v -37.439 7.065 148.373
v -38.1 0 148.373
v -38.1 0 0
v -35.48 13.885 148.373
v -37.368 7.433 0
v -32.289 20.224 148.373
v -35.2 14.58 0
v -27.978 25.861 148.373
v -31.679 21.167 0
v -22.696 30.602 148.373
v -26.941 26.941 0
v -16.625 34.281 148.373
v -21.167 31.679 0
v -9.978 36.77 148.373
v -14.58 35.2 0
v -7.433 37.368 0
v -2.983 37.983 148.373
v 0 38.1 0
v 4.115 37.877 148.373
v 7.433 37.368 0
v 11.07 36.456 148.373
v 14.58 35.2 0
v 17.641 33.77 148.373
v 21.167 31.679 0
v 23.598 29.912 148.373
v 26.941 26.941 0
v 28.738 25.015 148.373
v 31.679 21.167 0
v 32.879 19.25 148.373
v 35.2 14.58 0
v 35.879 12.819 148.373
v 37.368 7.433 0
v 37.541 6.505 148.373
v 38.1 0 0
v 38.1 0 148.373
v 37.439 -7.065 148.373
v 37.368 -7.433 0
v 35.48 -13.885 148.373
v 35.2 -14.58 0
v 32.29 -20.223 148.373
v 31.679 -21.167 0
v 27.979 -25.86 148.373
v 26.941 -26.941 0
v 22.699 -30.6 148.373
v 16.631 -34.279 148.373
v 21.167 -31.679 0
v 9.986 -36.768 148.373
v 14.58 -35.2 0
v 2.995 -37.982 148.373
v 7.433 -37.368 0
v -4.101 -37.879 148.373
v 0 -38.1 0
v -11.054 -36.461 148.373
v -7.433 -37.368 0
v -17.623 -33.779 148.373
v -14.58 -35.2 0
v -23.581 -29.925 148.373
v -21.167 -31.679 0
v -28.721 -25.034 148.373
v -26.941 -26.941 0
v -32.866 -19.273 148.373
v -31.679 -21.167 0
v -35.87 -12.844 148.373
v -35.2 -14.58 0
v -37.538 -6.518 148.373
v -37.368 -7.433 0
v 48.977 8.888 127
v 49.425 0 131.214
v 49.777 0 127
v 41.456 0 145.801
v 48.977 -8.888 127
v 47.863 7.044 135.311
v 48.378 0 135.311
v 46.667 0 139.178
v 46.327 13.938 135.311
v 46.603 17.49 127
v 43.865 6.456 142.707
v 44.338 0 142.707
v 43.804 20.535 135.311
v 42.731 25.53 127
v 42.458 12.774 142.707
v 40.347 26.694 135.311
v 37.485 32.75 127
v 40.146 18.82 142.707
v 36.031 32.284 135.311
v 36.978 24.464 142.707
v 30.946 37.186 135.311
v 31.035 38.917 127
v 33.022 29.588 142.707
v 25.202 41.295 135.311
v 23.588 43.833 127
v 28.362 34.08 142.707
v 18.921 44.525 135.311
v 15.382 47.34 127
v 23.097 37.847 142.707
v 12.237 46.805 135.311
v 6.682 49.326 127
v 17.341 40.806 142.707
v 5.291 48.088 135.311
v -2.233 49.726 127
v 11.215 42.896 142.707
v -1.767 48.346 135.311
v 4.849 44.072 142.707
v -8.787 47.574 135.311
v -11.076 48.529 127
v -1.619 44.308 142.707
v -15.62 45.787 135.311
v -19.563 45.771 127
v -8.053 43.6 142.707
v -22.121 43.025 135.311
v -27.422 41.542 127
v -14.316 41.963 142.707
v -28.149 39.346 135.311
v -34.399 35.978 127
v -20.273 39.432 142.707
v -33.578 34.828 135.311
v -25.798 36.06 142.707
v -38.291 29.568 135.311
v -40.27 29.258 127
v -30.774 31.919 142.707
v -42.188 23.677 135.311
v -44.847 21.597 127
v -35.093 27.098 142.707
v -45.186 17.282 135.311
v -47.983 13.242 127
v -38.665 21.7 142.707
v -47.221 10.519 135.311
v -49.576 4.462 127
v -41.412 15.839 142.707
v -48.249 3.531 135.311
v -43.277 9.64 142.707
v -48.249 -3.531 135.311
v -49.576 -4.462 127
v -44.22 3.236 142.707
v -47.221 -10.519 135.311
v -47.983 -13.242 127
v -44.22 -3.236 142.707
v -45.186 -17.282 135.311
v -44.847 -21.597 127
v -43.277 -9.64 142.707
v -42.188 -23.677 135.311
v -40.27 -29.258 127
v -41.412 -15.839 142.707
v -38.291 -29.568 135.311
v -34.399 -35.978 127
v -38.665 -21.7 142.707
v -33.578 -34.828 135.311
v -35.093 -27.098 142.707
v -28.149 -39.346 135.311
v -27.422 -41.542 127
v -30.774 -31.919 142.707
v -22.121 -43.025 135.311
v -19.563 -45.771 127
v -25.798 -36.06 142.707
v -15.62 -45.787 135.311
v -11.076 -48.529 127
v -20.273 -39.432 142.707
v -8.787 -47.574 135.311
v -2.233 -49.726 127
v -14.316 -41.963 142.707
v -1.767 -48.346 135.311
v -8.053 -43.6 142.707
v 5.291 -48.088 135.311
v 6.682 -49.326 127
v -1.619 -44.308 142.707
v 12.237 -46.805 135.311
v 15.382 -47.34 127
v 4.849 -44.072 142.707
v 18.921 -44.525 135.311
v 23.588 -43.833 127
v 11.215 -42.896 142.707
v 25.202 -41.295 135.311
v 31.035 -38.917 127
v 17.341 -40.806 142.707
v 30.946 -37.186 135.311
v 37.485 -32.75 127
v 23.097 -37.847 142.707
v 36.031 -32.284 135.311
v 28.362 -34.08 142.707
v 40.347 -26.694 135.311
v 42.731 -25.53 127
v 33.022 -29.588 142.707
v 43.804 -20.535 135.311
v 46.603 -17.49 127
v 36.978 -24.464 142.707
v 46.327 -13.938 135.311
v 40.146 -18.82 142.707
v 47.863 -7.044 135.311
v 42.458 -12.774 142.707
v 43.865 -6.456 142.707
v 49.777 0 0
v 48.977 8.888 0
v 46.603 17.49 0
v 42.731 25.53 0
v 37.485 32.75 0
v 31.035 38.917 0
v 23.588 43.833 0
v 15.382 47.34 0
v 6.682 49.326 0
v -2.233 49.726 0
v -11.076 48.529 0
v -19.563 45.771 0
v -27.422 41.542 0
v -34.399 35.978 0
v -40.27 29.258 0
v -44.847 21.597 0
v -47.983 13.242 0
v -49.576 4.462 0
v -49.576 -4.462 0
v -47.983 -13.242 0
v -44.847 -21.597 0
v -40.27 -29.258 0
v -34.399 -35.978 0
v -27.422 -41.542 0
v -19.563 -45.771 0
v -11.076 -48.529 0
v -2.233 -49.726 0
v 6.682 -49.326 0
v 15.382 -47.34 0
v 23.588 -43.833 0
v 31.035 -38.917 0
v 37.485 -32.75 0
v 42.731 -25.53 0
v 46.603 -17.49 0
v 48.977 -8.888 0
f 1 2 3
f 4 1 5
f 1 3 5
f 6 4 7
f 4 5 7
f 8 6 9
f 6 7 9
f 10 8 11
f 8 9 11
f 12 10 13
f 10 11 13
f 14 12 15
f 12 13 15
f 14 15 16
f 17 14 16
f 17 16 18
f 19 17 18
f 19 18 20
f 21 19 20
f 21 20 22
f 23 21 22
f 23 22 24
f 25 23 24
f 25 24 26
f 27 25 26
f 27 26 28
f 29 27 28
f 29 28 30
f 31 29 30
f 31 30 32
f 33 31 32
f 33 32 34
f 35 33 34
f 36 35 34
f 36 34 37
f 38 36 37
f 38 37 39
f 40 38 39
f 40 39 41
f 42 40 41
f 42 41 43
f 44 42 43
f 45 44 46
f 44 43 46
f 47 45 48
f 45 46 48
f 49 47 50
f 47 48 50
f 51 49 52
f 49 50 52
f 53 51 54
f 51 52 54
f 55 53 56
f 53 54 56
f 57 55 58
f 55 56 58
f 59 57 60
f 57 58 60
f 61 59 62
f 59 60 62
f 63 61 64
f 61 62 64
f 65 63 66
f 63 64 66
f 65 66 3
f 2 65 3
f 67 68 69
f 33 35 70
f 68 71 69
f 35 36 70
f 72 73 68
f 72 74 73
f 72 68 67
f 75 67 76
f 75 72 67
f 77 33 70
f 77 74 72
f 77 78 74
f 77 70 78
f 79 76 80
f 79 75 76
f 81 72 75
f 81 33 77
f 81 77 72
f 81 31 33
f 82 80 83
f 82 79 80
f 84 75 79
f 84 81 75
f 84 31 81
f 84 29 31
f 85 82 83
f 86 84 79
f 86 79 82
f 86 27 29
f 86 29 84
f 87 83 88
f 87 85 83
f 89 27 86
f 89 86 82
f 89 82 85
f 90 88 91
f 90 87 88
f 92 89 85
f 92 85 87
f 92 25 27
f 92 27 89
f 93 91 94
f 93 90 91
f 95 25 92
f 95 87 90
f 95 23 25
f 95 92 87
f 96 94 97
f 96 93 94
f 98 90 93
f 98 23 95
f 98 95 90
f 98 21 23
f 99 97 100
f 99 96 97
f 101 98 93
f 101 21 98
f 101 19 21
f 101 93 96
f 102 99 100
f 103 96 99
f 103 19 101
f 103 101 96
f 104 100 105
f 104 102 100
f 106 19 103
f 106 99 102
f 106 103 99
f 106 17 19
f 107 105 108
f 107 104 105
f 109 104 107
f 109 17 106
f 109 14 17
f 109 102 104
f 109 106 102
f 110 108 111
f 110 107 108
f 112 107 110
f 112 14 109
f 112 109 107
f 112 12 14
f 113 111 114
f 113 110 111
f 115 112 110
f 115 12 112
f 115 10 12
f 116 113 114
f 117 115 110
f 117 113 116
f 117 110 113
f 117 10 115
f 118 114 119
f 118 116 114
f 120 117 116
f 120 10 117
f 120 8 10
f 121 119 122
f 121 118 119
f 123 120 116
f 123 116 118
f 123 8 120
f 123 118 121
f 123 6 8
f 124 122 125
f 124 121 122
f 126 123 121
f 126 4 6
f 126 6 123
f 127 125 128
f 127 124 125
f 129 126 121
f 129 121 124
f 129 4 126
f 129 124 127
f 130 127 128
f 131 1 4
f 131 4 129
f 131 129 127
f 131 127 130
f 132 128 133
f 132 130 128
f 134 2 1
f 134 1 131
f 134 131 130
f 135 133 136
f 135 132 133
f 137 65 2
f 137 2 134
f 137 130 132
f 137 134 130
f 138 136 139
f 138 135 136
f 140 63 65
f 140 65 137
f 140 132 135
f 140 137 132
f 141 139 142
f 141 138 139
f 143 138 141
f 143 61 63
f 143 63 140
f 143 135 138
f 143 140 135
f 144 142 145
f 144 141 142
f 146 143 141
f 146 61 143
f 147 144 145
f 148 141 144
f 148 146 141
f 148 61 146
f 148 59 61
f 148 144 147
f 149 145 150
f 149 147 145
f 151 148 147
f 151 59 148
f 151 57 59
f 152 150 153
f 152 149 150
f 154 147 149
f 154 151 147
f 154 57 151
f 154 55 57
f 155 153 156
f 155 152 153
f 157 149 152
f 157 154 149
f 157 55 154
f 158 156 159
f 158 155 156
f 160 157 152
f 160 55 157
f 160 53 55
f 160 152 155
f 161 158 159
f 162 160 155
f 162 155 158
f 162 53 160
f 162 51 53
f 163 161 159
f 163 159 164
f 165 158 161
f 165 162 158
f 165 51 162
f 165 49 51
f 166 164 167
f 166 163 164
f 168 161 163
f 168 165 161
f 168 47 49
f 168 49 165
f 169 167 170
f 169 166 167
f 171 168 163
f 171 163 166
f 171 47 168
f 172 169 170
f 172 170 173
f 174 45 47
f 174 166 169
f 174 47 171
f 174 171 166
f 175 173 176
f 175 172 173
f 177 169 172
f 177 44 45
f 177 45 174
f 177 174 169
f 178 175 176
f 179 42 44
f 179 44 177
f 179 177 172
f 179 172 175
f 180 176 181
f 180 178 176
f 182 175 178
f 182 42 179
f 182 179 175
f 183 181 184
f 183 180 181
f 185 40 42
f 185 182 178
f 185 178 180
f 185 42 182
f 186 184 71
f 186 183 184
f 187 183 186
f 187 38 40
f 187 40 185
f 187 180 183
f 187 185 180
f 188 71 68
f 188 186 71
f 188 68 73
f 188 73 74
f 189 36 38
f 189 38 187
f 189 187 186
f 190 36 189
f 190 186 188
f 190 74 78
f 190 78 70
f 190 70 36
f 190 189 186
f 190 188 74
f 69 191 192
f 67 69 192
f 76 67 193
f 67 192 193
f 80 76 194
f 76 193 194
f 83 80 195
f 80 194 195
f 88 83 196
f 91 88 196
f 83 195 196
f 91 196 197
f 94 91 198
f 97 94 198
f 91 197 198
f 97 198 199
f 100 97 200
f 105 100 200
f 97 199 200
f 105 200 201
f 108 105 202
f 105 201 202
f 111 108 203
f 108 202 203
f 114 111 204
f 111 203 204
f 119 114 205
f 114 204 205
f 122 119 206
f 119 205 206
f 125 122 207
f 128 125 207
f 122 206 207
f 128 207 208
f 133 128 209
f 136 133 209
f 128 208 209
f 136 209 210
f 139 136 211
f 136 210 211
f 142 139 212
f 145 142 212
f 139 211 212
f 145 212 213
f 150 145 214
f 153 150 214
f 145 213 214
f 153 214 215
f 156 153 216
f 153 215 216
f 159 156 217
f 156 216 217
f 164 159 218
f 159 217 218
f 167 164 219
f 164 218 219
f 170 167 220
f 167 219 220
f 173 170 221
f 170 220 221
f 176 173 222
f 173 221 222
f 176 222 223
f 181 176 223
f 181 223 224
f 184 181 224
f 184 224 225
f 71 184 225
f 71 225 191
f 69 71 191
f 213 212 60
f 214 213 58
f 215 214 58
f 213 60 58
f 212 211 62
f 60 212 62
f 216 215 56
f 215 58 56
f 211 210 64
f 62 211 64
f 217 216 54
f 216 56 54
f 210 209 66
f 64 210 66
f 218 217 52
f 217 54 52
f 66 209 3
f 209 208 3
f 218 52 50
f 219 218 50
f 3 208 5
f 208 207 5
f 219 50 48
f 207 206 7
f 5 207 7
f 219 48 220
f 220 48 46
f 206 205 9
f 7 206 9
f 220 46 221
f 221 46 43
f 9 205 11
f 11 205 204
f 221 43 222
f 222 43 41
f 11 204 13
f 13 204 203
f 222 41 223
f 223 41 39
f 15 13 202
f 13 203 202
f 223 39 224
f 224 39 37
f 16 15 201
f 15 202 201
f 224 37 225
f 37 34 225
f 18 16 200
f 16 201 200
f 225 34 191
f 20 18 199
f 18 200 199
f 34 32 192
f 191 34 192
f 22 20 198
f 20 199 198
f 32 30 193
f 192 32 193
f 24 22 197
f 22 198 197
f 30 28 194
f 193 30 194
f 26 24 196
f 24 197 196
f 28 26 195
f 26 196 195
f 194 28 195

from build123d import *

# Parameters (mm, degrees)
F0_R     = 49.7765250683
F1_DEPTH = 152.4
F2_R     = 25.4
F4_D     = 76.2


# Not quite as in the source:
# - the program builds the solid bodies; features that only make, move or delete a surface that nothing else refers to are left out


with BuildPart() as f1:
    # F0 (on Top) → F1 (new body)
    with BuildSketch(Plane.XY):
        Circle(F0_R)
    extrude(amount=F1_DEPTH)

    # F2
    f2_edges = [f1.edges().sort_by_distance(p)[0] for p in [
        (-49.776525, 0, 152.4),
    ]]
    fillet(f2_edges, radius=F2_R)

    # F4 (through all)
    with Locations(Plane.XY.offset(152.4)):
        with Locations((0, 0)):
            Hole(F4_D / 2)


solid = f1.part
